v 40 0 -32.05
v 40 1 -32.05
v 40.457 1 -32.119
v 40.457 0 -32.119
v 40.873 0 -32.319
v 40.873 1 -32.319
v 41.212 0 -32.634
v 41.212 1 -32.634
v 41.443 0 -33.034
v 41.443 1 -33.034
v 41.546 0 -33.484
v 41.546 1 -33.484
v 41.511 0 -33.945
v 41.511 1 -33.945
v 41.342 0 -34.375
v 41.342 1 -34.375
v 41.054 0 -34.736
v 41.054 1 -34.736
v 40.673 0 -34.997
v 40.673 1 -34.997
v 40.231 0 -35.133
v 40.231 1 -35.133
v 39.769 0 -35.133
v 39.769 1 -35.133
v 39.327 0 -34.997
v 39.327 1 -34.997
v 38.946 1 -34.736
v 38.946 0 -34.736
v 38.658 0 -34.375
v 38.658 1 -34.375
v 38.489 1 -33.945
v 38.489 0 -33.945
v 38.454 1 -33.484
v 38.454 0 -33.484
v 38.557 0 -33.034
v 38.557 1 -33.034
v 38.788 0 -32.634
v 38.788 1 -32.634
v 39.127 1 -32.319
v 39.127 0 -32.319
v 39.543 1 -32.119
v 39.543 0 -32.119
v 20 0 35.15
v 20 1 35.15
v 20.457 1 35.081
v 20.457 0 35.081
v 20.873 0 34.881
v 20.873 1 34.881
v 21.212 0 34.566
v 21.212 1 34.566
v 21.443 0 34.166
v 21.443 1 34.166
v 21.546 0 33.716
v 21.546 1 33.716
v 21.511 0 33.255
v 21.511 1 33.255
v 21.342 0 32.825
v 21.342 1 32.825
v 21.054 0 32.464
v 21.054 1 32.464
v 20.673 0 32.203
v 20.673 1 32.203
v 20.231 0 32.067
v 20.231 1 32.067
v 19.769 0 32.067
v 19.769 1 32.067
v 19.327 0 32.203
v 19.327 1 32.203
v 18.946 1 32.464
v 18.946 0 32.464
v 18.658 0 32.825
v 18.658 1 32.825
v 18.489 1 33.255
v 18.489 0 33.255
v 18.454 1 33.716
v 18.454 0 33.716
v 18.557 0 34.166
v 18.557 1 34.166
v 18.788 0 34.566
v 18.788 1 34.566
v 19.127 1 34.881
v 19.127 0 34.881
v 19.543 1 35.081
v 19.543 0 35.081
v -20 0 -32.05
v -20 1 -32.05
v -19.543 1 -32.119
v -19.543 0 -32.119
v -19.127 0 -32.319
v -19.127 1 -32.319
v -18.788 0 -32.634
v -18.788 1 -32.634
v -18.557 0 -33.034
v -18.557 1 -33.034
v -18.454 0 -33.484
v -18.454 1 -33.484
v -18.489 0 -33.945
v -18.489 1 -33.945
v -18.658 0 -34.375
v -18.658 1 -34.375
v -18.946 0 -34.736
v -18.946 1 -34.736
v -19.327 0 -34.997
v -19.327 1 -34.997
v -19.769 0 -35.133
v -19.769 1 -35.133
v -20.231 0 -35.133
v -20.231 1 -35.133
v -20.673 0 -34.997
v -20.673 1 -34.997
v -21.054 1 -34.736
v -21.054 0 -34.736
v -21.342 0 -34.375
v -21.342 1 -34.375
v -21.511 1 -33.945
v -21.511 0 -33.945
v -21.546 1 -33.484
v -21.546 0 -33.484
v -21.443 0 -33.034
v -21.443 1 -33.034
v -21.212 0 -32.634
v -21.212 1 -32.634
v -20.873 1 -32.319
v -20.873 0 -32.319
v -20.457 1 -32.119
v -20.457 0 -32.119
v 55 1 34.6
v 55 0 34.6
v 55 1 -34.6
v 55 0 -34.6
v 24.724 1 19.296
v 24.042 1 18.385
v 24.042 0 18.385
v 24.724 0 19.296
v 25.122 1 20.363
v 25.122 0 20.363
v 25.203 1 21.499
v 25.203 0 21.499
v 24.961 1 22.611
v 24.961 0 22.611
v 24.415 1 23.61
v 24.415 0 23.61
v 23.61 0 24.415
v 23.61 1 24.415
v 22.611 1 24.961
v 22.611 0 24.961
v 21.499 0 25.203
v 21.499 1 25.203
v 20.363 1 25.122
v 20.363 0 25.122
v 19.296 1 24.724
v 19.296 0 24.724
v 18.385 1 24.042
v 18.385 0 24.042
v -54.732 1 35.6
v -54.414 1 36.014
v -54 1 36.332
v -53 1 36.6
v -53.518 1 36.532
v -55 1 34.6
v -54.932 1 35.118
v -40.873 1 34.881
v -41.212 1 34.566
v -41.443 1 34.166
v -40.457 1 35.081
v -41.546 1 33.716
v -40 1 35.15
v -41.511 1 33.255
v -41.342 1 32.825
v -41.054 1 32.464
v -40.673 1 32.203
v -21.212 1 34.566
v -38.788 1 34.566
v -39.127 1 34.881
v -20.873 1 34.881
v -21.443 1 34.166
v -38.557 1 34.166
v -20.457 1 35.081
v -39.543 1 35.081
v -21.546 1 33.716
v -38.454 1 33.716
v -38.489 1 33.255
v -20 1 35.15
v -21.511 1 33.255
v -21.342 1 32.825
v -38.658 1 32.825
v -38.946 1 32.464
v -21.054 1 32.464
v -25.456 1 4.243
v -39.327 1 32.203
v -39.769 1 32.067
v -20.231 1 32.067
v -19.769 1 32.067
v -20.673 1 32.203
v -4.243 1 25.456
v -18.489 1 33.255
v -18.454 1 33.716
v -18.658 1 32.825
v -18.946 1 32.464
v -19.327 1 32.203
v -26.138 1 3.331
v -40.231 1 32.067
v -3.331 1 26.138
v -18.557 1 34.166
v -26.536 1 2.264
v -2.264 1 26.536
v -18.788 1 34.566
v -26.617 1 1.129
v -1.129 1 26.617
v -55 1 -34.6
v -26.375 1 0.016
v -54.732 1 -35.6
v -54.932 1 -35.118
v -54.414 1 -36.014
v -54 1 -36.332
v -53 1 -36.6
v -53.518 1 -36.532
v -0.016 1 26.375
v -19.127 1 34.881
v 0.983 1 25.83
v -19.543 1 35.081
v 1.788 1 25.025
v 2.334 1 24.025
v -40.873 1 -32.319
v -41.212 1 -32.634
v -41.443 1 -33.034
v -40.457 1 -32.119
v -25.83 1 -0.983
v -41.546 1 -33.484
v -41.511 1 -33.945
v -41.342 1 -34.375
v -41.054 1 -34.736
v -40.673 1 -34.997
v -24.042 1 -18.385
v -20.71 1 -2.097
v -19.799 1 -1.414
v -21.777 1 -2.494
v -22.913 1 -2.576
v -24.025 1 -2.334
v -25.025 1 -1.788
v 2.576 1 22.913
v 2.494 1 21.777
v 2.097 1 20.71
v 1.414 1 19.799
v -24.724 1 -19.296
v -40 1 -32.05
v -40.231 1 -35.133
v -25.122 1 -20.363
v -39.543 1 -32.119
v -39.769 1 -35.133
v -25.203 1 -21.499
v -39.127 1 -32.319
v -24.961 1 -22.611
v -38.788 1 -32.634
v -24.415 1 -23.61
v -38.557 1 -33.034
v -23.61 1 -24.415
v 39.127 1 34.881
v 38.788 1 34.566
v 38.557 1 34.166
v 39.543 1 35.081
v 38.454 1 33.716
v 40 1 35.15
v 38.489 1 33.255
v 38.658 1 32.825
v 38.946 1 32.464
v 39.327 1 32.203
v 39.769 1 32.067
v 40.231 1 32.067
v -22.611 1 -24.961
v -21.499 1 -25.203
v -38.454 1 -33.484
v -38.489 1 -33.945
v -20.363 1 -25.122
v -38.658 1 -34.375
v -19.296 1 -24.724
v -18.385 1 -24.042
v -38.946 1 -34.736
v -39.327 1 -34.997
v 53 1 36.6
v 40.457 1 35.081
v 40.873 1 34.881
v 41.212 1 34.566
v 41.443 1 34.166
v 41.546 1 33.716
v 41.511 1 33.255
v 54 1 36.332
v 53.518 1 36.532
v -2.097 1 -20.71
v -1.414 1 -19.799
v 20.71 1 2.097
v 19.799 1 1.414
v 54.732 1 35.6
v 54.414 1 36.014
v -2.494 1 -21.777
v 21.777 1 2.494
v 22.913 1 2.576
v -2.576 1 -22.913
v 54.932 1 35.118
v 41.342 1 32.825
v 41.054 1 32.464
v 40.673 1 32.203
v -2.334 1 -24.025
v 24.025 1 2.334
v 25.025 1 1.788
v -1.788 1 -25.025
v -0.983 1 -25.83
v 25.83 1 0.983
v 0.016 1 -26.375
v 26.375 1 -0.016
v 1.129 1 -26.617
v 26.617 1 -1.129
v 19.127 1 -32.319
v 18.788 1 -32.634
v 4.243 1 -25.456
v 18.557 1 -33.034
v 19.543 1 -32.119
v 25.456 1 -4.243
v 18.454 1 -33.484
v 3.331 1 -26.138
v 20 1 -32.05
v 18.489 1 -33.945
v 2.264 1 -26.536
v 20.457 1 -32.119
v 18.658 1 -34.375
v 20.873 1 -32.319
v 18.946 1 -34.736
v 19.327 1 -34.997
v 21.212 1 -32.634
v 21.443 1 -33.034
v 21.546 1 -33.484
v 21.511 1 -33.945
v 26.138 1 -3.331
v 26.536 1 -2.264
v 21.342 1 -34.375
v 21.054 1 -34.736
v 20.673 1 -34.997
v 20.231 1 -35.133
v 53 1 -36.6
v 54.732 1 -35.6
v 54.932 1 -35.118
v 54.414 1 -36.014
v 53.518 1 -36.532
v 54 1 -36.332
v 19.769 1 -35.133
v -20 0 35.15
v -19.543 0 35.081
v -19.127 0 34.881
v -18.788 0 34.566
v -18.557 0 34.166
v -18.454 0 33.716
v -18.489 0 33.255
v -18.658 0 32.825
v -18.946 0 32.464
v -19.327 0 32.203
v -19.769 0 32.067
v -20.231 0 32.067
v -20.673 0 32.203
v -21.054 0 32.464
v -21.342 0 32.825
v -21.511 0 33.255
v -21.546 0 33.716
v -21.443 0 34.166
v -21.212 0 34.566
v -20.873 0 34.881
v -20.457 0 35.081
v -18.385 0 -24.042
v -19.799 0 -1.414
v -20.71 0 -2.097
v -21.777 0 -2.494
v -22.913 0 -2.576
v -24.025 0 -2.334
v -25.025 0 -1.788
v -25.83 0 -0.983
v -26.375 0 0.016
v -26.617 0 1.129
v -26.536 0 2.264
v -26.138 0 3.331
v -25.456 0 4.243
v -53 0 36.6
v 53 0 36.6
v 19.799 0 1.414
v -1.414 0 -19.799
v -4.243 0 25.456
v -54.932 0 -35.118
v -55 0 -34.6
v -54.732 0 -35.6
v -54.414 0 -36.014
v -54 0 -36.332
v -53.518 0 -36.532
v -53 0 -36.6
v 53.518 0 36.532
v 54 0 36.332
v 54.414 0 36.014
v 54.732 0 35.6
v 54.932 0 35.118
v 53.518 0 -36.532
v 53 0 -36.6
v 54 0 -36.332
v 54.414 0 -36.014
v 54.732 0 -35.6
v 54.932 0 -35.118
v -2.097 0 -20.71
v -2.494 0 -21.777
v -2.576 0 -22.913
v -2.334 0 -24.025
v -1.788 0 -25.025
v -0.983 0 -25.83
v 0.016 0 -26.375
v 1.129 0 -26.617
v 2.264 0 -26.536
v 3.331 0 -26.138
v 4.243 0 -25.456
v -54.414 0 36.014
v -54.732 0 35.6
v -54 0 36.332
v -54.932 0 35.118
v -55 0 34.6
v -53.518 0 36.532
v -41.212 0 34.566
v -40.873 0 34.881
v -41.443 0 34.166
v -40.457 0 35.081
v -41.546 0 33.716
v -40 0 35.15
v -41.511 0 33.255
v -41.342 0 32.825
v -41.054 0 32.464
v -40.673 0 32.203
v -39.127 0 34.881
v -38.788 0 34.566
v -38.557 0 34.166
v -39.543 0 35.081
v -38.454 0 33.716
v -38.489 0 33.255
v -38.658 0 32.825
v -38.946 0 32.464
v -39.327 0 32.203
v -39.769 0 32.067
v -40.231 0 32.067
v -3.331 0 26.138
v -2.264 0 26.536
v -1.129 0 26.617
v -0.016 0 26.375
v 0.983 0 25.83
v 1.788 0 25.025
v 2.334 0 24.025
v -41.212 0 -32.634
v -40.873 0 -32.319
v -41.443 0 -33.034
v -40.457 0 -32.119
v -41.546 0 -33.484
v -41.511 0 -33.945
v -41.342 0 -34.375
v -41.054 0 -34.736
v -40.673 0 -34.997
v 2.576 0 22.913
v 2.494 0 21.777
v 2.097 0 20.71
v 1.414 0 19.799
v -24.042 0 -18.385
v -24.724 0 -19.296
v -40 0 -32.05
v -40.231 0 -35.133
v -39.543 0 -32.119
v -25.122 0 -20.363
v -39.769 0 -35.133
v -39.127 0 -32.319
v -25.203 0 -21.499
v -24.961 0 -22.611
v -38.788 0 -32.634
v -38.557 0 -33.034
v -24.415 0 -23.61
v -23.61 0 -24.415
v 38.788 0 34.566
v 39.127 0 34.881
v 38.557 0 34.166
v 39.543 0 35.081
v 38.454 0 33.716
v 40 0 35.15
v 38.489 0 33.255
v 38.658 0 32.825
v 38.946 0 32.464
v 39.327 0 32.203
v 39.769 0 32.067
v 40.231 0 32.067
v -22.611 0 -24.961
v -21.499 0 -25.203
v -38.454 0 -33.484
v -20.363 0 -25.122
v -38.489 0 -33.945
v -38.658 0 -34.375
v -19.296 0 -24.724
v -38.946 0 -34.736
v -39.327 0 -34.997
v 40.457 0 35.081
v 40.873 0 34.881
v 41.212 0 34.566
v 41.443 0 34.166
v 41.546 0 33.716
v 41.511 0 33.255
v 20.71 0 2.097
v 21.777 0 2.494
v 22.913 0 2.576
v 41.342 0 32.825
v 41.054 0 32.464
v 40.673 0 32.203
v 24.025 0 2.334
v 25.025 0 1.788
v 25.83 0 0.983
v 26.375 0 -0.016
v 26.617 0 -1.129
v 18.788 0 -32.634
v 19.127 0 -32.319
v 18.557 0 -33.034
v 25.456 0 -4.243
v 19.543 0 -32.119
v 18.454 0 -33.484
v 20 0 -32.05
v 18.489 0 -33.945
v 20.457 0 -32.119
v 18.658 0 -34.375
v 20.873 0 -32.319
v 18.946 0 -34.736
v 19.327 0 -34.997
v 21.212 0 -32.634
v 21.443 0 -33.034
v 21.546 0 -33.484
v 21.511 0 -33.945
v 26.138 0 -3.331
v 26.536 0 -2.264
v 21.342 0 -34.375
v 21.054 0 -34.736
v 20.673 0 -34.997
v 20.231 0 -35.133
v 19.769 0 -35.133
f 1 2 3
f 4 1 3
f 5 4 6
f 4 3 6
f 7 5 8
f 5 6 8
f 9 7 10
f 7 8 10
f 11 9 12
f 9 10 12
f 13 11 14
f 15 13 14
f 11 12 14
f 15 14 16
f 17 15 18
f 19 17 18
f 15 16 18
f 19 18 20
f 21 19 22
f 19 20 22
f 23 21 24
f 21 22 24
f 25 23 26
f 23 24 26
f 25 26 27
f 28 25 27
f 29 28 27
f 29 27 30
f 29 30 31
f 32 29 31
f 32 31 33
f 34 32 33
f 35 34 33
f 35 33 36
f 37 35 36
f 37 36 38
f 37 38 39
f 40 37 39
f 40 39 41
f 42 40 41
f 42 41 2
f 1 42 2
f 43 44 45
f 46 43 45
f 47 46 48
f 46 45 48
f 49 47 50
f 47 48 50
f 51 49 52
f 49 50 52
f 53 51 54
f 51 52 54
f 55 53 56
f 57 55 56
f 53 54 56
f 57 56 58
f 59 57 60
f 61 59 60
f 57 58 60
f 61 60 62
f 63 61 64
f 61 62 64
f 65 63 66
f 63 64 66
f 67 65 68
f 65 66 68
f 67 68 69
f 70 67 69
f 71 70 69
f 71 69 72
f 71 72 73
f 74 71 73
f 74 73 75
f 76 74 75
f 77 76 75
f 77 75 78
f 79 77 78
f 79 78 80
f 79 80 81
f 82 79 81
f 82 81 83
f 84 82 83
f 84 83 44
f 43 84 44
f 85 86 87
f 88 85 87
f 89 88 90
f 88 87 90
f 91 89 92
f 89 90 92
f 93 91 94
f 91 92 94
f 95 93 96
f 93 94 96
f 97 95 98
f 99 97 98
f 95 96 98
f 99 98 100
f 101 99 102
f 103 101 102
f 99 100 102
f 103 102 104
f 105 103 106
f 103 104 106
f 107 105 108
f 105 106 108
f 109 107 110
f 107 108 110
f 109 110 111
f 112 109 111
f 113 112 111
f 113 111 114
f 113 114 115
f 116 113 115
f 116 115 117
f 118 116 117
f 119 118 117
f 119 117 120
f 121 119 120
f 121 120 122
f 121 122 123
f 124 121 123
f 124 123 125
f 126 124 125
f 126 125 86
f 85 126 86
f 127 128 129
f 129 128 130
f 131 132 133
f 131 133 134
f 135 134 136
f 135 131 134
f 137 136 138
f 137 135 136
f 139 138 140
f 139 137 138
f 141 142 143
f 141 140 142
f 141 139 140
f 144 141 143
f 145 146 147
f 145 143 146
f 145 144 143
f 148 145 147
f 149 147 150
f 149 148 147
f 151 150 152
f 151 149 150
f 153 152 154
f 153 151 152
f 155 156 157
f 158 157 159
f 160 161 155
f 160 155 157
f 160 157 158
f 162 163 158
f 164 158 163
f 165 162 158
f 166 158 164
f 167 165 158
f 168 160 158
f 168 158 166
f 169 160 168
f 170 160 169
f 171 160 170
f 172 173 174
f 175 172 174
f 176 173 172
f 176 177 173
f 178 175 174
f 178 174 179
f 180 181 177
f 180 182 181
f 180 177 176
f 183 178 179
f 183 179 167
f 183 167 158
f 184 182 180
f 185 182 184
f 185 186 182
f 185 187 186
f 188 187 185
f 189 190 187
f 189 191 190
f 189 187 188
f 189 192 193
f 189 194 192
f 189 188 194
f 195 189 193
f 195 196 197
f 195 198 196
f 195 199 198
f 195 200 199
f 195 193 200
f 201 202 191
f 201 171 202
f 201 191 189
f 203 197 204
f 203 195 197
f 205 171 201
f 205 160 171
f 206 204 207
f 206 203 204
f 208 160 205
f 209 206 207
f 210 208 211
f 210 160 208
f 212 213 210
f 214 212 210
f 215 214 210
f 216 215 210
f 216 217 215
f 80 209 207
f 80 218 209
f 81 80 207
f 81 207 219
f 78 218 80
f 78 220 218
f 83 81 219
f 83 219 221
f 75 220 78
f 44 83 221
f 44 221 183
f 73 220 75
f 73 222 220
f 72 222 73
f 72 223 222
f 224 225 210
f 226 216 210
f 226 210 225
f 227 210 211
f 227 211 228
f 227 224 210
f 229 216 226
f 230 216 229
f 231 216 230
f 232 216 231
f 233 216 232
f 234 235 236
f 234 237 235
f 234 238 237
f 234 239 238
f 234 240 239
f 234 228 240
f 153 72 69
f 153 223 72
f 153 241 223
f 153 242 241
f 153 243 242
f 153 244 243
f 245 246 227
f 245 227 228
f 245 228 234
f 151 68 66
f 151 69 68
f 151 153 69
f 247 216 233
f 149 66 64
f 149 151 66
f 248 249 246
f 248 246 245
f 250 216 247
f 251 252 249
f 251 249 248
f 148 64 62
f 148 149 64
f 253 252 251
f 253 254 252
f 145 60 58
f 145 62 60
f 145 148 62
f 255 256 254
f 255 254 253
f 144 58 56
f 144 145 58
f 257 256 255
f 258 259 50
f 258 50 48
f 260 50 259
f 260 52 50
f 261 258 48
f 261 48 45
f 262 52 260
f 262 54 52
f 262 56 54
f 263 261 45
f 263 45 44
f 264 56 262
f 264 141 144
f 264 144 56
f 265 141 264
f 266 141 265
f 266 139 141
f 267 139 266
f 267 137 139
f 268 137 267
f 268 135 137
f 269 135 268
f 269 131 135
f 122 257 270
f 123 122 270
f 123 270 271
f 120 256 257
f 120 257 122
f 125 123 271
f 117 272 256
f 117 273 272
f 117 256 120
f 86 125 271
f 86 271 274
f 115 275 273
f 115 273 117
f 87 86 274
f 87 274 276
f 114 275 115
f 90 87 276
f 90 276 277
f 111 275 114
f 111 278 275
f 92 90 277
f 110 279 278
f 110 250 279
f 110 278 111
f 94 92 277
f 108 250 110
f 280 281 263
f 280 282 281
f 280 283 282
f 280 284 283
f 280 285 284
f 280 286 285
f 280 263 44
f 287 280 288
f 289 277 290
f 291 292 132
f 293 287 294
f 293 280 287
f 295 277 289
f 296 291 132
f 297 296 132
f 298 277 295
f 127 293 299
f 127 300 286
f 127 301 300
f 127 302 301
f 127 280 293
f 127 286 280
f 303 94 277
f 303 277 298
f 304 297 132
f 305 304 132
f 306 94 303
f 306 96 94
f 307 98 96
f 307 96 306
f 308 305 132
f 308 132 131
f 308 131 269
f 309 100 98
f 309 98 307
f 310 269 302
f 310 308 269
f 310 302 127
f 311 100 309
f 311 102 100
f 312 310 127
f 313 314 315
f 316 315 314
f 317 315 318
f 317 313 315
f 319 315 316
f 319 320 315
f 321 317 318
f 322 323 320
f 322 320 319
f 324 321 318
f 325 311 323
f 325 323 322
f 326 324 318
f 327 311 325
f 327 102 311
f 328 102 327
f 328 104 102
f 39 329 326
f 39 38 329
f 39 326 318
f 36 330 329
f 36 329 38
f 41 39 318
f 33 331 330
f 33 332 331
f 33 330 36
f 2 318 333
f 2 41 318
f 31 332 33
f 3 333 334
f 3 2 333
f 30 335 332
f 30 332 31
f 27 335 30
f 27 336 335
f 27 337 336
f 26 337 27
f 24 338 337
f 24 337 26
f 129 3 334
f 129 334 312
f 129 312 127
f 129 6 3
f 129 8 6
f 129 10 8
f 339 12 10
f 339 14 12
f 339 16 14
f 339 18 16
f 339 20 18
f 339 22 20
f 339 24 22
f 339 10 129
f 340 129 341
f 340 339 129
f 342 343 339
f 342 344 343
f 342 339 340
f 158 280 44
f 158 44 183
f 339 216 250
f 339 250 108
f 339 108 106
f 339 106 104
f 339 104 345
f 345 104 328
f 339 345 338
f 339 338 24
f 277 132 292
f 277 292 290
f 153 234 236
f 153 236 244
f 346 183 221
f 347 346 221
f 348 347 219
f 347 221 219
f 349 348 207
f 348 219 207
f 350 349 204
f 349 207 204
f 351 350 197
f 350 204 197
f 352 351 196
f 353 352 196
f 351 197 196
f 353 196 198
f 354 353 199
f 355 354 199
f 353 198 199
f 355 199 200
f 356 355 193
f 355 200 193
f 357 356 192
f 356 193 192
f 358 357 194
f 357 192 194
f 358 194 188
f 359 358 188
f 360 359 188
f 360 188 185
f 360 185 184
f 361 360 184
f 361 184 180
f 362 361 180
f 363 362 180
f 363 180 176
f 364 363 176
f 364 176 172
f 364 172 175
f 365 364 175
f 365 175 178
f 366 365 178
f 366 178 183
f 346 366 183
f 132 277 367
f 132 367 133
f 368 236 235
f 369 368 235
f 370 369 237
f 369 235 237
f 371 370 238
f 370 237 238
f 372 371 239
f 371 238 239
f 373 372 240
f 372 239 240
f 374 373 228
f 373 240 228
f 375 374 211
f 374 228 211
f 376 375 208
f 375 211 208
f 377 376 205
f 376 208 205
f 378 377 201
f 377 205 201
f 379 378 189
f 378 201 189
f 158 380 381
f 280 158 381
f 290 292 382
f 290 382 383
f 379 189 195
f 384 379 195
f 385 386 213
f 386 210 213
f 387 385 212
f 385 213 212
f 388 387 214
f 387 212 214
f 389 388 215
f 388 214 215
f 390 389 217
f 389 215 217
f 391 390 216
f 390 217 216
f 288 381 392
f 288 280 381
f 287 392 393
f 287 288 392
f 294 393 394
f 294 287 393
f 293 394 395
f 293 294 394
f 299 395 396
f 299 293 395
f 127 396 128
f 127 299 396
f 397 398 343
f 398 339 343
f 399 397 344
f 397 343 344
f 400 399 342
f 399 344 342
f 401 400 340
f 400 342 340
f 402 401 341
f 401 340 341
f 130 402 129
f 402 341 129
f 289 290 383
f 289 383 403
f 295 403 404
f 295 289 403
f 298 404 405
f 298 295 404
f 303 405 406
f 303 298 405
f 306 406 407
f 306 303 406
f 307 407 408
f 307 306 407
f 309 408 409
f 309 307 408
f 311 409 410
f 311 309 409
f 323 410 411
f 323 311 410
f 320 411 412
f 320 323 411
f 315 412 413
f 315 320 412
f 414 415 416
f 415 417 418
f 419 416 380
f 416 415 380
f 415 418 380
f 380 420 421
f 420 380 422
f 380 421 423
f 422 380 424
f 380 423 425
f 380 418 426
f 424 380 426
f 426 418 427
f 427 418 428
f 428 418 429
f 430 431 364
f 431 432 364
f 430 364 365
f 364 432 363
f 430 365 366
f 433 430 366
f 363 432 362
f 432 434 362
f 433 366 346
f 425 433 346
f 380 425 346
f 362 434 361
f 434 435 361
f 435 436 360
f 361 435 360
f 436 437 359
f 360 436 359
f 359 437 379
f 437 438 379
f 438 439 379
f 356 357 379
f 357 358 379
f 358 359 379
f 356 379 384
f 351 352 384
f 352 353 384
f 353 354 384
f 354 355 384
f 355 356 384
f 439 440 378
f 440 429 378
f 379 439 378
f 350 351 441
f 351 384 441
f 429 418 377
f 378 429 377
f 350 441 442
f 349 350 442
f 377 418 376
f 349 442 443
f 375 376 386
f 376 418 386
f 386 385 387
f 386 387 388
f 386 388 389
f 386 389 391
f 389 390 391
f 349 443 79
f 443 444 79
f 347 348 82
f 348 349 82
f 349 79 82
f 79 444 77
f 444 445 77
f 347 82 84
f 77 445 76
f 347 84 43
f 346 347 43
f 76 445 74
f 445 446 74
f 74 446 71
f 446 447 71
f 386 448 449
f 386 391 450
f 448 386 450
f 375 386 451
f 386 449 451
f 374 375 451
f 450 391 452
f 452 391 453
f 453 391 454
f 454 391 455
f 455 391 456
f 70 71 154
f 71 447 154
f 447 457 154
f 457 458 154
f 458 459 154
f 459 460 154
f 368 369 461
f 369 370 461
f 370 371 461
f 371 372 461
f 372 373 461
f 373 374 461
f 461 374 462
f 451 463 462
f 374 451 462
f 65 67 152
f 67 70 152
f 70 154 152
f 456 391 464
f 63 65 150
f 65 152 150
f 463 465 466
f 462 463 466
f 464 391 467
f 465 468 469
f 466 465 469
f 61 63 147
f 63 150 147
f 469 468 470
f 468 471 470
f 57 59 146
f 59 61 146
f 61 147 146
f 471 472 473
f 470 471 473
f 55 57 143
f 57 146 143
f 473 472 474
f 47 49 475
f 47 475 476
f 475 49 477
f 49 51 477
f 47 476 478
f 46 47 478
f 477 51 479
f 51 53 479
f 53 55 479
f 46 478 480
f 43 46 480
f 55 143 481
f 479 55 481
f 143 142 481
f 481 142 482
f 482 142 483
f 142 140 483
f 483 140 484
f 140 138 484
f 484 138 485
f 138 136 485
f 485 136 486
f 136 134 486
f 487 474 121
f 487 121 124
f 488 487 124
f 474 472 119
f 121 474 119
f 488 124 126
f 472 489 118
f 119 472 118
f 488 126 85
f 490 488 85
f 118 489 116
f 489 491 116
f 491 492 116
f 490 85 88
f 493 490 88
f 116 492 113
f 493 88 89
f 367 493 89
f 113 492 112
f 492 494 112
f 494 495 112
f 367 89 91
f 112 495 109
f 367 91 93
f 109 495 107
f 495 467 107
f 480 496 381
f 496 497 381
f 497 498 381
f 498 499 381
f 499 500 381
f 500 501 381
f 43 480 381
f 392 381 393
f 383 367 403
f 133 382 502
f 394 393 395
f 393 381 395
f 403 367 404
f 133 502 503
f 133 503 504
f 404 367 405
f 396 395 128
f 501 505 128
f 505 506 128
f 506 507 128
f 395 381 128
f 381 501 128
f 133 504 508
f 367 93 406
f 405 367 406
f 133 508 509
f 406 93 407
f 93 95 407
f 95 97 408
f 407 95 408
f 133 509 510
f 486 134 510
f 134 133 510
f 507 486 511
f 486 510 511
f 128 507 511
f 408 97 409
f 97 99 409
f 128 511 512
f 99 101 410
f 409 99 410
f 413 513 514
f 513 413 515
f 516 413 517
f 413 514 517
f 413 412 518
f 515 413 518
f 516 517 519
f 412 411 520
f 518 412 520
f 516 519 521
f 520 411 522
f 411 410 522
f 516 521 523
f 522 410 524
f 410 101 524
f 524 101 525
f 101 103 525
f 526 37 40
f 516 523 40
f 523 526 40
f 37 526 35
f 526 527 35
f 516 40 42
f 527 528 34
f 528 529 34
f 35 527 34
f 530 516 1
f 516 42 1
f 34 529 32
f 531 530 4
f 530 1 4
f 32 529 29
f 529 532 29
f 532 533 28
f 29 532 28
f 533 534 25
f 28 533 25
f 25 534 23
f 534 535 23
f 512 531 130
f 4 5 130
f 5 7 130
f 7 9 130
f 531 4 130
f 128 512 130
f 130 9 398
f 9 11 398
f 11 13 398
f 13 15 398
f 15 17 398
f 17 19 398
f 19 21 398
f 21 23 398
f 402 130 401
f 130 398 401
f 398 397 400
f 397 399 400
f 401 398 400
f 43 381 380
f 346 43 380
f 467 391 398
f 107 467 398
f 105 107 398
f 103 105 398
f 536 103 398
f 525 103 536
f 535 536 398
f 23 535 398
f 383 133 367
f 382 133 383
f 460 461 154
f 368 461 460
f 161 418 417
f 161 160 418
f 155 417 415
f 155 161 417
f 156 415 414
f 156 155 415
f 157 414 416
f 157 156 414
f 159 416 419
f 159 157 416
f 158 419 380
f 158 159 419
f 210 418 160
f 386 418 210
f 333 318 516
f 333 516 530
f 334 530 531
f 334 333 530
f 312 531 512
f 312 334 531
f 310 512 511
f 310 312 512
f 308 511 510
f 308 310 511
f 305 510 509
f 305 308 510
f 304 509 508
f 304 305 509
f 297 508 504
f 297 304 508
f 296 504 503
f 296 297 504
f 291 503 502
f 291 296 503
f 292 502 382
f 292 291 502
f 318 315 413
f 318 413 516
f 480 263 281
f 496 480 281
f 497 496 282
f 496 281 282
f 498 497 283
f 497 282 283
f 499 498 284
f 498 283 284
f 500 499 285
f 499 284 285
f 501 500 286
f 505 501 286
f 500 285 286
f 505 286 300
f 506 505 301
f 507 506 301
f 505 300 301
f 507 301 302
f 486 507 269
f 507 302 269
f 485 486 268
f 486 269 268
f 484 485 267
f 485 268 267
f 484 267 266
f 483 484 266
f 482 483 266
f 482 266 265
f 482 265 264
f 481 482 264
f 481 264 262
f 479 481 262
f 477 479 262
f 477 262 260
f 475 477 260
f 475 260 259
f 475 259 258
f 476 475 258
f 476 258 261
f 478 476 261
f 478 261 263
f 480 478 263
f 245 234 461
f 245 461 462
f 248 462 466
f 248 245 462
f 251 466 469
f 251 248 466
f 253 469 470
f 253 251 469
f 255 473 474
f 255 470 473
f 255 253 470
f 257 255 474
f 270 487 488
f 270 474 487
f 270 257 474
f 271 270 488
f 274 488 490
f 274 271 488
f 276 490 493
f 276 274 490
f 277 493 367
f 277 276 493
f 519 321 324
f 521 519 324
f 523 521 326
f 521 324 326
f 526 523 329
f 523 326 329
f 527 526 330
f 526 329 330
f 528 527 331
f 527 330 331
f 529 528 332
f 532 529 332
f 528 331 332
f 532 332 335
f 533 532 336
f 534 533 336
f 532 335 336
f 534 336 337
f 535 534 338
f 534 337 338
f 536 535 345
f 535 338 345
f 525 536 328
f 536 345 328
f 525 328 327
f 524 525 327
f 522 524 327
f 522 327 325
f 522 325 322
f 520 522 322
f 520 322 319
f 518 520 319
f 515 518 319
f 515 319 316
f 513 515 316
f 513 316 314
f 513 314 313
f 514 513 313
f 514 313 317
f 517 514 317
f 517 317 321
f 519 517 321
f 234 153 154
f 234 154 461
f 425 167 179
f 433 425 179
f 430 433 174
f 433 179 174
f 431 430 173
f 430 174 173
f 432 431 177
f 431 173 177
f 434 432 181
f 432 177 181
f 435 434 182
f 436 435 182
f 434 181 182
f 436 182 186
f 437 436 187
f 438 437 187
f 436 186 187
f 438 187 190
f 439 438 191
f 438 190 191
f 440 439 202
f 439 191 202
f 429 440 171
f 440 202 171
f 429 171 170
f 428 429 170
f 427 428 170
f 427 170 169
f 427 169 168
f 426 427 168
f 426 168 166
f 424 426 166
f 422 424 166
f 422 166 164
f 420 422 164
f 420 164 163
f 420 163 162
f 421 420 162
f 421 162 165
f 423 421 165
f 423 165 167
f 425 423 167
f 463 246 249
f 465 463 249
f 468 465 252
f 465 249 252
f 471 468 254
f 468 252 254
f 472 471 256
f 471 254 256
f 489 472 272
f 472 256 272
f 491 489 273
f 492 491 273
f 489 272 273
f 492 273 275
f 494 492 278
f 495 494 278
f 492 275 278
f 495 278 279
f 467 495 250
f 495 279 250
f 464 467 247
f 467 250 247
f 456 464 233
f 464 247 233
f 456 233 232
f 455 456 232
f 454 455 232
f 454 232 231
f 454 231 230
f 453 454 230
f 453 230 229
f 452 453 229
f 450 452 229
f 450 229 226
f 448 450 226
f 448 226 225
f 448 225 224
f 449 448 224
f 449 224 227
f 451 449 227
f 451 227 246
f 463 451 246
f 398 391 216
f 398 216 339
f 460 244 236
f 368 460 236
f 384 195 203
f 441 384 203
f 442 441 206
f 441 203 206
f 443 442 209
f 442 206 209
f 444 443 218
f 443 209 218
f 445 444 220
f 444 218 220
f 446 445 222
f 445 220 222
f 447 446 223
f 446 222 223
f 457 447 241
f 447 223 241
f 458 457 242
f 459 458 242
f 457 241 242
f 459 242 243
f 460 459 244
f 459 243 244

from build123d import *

# Parameters (mm, degrees)
SKETCH_1_W          = 110
SKETCH_1_H          = 73.2
EXTRUDE_1_DEPTH     = 1
SKETCH_2_R          = 1.55
CUT_EXTRUDE_1_DEPTH = 5
FILLET_1_R          = 2
CUT_EXTRUDE_4_DEPTH = 10


with BuildPart() as part:
    # 草图1 → 凸台-拉伸1 (new body)
    with BuildSketch(Plane(origin=(0, 0, 0), x_dir=(1, 0, 0), z_dir=(0, 1, 0))):
        Rectangle(SKETCH_1_W, SKETCH_1_H)
    extrude(amount=EXTRUDE_1_DEPTH)

    # 草图2 → 切除-拉伸1 (cut)
    with BuildSketch(Plane(origin=(0, 1, 0), x_dir=(1, 0, 0), z_dir=(0, 1, 0))):
        with Locations(Location((20, 33.6, 0), (0, 0, 270))):
            Circle(SKETCH_2_R)
        with Locations(Location((40, 33.6, 0), (0, 0, 270))):
            Circle(SKETCH_2_R)
        with Locations(Location((40, -33.6, 0), (0, 0, 270))):
            Circle(SKETCH_2_R)
        with Locations(Location((20, -33.6, 0), (0, 0, 270))):
            Circle(SKETCH_2_R)
        with Locations(Location((-20, -33.6, 0), (0, 0, 270))):
            Circle(SKETCH_2_R)
        with Locations(Location((-40, -33.6, 0), (0, 0, 270))):
            Circle(SKETCH_2_R)
        with Locations(Location((-40, 33.6, 0), (0, 0, 270))):
            Circle(SKETCH_2_R)
        with Locations(Location((-20, 33.6, 0), (0, 0, 270))):
            Circle(SKETCH_2_R)
    extrude(amount=-CUT_EXTRUDE_1_DEPTH, mode=Mode.SUBTRACT)

    # 圆角1
    fillet_1_edges = [part.edges().sort_by_distance(p)[0] for p in [
        (55, 0.5, 36.6),
        (-55, 0.5, 36.6),
        (-55, 0.5, -36.6),
        (55, 0.5, -36.6),
    ]]
    fillet(fillet_1_edges, radius=FILLET_1_R)

    # 草图4 → 切除-拉伸4 (cut)
    with BuildSketch(Plane(origin=(0, 1, 0), x_dir=(1, 0, 0), z_dir=(0, 1, 0))):
        with BuildLine():
            Line((-18.384776311, 24.04163056), (24.04163056, -18.384776311))
            ThreePointArc((24.04163056, -18.384776311), (24.04163056, -24.04163056), (18.384776311, -24.04163056))
            Line((18.384776311, -24.04163056), (-24.04163056, 18.384776311))
            ThreePointArc((-24.04163056, 18.384776311), (-24.04163056, 24.04163056), (-18.384776311, 24.04163056))
        make_face()
        with BuildLine():
            Line((4.242640687, 25.455844123), (25.455844123, 4.242640687))
            ThreePointArc((25.455844123, 4.242640687), (25.455844123, -1.414213562), (19.798989873, -1.414213562))
            Line((19.798989873, -1.414213562), (-1.414213562, 19.798989873))
            ThreePointArc((-1.414213562, 19.798989873), (-1.414213562, 25.455844123), (4.242640687, 25.455844123))
        make_face()
        with BuildLine():
            Line((-25.455844123, -4.242640687), (-4.242640687, -25.455844123))
            ThreePointArc((-4.242640687, -25.455844123), (1.414213562, -25.455844123), (1.414213562, -19.798989873))
            Line((1.414213562, -19.798989873), (-19.798989873, 1.414213562))
            ThreePointArc((-19.798989873, 1.414213562), (-25.455844123, 1.414213562), (-25.455844123, -4.242640687))
        make_face()
    extrude(amount=-CUT_EXTRUDE_4_DEPTH, mode=Mode.SUBTRACT)


solid = part.part
